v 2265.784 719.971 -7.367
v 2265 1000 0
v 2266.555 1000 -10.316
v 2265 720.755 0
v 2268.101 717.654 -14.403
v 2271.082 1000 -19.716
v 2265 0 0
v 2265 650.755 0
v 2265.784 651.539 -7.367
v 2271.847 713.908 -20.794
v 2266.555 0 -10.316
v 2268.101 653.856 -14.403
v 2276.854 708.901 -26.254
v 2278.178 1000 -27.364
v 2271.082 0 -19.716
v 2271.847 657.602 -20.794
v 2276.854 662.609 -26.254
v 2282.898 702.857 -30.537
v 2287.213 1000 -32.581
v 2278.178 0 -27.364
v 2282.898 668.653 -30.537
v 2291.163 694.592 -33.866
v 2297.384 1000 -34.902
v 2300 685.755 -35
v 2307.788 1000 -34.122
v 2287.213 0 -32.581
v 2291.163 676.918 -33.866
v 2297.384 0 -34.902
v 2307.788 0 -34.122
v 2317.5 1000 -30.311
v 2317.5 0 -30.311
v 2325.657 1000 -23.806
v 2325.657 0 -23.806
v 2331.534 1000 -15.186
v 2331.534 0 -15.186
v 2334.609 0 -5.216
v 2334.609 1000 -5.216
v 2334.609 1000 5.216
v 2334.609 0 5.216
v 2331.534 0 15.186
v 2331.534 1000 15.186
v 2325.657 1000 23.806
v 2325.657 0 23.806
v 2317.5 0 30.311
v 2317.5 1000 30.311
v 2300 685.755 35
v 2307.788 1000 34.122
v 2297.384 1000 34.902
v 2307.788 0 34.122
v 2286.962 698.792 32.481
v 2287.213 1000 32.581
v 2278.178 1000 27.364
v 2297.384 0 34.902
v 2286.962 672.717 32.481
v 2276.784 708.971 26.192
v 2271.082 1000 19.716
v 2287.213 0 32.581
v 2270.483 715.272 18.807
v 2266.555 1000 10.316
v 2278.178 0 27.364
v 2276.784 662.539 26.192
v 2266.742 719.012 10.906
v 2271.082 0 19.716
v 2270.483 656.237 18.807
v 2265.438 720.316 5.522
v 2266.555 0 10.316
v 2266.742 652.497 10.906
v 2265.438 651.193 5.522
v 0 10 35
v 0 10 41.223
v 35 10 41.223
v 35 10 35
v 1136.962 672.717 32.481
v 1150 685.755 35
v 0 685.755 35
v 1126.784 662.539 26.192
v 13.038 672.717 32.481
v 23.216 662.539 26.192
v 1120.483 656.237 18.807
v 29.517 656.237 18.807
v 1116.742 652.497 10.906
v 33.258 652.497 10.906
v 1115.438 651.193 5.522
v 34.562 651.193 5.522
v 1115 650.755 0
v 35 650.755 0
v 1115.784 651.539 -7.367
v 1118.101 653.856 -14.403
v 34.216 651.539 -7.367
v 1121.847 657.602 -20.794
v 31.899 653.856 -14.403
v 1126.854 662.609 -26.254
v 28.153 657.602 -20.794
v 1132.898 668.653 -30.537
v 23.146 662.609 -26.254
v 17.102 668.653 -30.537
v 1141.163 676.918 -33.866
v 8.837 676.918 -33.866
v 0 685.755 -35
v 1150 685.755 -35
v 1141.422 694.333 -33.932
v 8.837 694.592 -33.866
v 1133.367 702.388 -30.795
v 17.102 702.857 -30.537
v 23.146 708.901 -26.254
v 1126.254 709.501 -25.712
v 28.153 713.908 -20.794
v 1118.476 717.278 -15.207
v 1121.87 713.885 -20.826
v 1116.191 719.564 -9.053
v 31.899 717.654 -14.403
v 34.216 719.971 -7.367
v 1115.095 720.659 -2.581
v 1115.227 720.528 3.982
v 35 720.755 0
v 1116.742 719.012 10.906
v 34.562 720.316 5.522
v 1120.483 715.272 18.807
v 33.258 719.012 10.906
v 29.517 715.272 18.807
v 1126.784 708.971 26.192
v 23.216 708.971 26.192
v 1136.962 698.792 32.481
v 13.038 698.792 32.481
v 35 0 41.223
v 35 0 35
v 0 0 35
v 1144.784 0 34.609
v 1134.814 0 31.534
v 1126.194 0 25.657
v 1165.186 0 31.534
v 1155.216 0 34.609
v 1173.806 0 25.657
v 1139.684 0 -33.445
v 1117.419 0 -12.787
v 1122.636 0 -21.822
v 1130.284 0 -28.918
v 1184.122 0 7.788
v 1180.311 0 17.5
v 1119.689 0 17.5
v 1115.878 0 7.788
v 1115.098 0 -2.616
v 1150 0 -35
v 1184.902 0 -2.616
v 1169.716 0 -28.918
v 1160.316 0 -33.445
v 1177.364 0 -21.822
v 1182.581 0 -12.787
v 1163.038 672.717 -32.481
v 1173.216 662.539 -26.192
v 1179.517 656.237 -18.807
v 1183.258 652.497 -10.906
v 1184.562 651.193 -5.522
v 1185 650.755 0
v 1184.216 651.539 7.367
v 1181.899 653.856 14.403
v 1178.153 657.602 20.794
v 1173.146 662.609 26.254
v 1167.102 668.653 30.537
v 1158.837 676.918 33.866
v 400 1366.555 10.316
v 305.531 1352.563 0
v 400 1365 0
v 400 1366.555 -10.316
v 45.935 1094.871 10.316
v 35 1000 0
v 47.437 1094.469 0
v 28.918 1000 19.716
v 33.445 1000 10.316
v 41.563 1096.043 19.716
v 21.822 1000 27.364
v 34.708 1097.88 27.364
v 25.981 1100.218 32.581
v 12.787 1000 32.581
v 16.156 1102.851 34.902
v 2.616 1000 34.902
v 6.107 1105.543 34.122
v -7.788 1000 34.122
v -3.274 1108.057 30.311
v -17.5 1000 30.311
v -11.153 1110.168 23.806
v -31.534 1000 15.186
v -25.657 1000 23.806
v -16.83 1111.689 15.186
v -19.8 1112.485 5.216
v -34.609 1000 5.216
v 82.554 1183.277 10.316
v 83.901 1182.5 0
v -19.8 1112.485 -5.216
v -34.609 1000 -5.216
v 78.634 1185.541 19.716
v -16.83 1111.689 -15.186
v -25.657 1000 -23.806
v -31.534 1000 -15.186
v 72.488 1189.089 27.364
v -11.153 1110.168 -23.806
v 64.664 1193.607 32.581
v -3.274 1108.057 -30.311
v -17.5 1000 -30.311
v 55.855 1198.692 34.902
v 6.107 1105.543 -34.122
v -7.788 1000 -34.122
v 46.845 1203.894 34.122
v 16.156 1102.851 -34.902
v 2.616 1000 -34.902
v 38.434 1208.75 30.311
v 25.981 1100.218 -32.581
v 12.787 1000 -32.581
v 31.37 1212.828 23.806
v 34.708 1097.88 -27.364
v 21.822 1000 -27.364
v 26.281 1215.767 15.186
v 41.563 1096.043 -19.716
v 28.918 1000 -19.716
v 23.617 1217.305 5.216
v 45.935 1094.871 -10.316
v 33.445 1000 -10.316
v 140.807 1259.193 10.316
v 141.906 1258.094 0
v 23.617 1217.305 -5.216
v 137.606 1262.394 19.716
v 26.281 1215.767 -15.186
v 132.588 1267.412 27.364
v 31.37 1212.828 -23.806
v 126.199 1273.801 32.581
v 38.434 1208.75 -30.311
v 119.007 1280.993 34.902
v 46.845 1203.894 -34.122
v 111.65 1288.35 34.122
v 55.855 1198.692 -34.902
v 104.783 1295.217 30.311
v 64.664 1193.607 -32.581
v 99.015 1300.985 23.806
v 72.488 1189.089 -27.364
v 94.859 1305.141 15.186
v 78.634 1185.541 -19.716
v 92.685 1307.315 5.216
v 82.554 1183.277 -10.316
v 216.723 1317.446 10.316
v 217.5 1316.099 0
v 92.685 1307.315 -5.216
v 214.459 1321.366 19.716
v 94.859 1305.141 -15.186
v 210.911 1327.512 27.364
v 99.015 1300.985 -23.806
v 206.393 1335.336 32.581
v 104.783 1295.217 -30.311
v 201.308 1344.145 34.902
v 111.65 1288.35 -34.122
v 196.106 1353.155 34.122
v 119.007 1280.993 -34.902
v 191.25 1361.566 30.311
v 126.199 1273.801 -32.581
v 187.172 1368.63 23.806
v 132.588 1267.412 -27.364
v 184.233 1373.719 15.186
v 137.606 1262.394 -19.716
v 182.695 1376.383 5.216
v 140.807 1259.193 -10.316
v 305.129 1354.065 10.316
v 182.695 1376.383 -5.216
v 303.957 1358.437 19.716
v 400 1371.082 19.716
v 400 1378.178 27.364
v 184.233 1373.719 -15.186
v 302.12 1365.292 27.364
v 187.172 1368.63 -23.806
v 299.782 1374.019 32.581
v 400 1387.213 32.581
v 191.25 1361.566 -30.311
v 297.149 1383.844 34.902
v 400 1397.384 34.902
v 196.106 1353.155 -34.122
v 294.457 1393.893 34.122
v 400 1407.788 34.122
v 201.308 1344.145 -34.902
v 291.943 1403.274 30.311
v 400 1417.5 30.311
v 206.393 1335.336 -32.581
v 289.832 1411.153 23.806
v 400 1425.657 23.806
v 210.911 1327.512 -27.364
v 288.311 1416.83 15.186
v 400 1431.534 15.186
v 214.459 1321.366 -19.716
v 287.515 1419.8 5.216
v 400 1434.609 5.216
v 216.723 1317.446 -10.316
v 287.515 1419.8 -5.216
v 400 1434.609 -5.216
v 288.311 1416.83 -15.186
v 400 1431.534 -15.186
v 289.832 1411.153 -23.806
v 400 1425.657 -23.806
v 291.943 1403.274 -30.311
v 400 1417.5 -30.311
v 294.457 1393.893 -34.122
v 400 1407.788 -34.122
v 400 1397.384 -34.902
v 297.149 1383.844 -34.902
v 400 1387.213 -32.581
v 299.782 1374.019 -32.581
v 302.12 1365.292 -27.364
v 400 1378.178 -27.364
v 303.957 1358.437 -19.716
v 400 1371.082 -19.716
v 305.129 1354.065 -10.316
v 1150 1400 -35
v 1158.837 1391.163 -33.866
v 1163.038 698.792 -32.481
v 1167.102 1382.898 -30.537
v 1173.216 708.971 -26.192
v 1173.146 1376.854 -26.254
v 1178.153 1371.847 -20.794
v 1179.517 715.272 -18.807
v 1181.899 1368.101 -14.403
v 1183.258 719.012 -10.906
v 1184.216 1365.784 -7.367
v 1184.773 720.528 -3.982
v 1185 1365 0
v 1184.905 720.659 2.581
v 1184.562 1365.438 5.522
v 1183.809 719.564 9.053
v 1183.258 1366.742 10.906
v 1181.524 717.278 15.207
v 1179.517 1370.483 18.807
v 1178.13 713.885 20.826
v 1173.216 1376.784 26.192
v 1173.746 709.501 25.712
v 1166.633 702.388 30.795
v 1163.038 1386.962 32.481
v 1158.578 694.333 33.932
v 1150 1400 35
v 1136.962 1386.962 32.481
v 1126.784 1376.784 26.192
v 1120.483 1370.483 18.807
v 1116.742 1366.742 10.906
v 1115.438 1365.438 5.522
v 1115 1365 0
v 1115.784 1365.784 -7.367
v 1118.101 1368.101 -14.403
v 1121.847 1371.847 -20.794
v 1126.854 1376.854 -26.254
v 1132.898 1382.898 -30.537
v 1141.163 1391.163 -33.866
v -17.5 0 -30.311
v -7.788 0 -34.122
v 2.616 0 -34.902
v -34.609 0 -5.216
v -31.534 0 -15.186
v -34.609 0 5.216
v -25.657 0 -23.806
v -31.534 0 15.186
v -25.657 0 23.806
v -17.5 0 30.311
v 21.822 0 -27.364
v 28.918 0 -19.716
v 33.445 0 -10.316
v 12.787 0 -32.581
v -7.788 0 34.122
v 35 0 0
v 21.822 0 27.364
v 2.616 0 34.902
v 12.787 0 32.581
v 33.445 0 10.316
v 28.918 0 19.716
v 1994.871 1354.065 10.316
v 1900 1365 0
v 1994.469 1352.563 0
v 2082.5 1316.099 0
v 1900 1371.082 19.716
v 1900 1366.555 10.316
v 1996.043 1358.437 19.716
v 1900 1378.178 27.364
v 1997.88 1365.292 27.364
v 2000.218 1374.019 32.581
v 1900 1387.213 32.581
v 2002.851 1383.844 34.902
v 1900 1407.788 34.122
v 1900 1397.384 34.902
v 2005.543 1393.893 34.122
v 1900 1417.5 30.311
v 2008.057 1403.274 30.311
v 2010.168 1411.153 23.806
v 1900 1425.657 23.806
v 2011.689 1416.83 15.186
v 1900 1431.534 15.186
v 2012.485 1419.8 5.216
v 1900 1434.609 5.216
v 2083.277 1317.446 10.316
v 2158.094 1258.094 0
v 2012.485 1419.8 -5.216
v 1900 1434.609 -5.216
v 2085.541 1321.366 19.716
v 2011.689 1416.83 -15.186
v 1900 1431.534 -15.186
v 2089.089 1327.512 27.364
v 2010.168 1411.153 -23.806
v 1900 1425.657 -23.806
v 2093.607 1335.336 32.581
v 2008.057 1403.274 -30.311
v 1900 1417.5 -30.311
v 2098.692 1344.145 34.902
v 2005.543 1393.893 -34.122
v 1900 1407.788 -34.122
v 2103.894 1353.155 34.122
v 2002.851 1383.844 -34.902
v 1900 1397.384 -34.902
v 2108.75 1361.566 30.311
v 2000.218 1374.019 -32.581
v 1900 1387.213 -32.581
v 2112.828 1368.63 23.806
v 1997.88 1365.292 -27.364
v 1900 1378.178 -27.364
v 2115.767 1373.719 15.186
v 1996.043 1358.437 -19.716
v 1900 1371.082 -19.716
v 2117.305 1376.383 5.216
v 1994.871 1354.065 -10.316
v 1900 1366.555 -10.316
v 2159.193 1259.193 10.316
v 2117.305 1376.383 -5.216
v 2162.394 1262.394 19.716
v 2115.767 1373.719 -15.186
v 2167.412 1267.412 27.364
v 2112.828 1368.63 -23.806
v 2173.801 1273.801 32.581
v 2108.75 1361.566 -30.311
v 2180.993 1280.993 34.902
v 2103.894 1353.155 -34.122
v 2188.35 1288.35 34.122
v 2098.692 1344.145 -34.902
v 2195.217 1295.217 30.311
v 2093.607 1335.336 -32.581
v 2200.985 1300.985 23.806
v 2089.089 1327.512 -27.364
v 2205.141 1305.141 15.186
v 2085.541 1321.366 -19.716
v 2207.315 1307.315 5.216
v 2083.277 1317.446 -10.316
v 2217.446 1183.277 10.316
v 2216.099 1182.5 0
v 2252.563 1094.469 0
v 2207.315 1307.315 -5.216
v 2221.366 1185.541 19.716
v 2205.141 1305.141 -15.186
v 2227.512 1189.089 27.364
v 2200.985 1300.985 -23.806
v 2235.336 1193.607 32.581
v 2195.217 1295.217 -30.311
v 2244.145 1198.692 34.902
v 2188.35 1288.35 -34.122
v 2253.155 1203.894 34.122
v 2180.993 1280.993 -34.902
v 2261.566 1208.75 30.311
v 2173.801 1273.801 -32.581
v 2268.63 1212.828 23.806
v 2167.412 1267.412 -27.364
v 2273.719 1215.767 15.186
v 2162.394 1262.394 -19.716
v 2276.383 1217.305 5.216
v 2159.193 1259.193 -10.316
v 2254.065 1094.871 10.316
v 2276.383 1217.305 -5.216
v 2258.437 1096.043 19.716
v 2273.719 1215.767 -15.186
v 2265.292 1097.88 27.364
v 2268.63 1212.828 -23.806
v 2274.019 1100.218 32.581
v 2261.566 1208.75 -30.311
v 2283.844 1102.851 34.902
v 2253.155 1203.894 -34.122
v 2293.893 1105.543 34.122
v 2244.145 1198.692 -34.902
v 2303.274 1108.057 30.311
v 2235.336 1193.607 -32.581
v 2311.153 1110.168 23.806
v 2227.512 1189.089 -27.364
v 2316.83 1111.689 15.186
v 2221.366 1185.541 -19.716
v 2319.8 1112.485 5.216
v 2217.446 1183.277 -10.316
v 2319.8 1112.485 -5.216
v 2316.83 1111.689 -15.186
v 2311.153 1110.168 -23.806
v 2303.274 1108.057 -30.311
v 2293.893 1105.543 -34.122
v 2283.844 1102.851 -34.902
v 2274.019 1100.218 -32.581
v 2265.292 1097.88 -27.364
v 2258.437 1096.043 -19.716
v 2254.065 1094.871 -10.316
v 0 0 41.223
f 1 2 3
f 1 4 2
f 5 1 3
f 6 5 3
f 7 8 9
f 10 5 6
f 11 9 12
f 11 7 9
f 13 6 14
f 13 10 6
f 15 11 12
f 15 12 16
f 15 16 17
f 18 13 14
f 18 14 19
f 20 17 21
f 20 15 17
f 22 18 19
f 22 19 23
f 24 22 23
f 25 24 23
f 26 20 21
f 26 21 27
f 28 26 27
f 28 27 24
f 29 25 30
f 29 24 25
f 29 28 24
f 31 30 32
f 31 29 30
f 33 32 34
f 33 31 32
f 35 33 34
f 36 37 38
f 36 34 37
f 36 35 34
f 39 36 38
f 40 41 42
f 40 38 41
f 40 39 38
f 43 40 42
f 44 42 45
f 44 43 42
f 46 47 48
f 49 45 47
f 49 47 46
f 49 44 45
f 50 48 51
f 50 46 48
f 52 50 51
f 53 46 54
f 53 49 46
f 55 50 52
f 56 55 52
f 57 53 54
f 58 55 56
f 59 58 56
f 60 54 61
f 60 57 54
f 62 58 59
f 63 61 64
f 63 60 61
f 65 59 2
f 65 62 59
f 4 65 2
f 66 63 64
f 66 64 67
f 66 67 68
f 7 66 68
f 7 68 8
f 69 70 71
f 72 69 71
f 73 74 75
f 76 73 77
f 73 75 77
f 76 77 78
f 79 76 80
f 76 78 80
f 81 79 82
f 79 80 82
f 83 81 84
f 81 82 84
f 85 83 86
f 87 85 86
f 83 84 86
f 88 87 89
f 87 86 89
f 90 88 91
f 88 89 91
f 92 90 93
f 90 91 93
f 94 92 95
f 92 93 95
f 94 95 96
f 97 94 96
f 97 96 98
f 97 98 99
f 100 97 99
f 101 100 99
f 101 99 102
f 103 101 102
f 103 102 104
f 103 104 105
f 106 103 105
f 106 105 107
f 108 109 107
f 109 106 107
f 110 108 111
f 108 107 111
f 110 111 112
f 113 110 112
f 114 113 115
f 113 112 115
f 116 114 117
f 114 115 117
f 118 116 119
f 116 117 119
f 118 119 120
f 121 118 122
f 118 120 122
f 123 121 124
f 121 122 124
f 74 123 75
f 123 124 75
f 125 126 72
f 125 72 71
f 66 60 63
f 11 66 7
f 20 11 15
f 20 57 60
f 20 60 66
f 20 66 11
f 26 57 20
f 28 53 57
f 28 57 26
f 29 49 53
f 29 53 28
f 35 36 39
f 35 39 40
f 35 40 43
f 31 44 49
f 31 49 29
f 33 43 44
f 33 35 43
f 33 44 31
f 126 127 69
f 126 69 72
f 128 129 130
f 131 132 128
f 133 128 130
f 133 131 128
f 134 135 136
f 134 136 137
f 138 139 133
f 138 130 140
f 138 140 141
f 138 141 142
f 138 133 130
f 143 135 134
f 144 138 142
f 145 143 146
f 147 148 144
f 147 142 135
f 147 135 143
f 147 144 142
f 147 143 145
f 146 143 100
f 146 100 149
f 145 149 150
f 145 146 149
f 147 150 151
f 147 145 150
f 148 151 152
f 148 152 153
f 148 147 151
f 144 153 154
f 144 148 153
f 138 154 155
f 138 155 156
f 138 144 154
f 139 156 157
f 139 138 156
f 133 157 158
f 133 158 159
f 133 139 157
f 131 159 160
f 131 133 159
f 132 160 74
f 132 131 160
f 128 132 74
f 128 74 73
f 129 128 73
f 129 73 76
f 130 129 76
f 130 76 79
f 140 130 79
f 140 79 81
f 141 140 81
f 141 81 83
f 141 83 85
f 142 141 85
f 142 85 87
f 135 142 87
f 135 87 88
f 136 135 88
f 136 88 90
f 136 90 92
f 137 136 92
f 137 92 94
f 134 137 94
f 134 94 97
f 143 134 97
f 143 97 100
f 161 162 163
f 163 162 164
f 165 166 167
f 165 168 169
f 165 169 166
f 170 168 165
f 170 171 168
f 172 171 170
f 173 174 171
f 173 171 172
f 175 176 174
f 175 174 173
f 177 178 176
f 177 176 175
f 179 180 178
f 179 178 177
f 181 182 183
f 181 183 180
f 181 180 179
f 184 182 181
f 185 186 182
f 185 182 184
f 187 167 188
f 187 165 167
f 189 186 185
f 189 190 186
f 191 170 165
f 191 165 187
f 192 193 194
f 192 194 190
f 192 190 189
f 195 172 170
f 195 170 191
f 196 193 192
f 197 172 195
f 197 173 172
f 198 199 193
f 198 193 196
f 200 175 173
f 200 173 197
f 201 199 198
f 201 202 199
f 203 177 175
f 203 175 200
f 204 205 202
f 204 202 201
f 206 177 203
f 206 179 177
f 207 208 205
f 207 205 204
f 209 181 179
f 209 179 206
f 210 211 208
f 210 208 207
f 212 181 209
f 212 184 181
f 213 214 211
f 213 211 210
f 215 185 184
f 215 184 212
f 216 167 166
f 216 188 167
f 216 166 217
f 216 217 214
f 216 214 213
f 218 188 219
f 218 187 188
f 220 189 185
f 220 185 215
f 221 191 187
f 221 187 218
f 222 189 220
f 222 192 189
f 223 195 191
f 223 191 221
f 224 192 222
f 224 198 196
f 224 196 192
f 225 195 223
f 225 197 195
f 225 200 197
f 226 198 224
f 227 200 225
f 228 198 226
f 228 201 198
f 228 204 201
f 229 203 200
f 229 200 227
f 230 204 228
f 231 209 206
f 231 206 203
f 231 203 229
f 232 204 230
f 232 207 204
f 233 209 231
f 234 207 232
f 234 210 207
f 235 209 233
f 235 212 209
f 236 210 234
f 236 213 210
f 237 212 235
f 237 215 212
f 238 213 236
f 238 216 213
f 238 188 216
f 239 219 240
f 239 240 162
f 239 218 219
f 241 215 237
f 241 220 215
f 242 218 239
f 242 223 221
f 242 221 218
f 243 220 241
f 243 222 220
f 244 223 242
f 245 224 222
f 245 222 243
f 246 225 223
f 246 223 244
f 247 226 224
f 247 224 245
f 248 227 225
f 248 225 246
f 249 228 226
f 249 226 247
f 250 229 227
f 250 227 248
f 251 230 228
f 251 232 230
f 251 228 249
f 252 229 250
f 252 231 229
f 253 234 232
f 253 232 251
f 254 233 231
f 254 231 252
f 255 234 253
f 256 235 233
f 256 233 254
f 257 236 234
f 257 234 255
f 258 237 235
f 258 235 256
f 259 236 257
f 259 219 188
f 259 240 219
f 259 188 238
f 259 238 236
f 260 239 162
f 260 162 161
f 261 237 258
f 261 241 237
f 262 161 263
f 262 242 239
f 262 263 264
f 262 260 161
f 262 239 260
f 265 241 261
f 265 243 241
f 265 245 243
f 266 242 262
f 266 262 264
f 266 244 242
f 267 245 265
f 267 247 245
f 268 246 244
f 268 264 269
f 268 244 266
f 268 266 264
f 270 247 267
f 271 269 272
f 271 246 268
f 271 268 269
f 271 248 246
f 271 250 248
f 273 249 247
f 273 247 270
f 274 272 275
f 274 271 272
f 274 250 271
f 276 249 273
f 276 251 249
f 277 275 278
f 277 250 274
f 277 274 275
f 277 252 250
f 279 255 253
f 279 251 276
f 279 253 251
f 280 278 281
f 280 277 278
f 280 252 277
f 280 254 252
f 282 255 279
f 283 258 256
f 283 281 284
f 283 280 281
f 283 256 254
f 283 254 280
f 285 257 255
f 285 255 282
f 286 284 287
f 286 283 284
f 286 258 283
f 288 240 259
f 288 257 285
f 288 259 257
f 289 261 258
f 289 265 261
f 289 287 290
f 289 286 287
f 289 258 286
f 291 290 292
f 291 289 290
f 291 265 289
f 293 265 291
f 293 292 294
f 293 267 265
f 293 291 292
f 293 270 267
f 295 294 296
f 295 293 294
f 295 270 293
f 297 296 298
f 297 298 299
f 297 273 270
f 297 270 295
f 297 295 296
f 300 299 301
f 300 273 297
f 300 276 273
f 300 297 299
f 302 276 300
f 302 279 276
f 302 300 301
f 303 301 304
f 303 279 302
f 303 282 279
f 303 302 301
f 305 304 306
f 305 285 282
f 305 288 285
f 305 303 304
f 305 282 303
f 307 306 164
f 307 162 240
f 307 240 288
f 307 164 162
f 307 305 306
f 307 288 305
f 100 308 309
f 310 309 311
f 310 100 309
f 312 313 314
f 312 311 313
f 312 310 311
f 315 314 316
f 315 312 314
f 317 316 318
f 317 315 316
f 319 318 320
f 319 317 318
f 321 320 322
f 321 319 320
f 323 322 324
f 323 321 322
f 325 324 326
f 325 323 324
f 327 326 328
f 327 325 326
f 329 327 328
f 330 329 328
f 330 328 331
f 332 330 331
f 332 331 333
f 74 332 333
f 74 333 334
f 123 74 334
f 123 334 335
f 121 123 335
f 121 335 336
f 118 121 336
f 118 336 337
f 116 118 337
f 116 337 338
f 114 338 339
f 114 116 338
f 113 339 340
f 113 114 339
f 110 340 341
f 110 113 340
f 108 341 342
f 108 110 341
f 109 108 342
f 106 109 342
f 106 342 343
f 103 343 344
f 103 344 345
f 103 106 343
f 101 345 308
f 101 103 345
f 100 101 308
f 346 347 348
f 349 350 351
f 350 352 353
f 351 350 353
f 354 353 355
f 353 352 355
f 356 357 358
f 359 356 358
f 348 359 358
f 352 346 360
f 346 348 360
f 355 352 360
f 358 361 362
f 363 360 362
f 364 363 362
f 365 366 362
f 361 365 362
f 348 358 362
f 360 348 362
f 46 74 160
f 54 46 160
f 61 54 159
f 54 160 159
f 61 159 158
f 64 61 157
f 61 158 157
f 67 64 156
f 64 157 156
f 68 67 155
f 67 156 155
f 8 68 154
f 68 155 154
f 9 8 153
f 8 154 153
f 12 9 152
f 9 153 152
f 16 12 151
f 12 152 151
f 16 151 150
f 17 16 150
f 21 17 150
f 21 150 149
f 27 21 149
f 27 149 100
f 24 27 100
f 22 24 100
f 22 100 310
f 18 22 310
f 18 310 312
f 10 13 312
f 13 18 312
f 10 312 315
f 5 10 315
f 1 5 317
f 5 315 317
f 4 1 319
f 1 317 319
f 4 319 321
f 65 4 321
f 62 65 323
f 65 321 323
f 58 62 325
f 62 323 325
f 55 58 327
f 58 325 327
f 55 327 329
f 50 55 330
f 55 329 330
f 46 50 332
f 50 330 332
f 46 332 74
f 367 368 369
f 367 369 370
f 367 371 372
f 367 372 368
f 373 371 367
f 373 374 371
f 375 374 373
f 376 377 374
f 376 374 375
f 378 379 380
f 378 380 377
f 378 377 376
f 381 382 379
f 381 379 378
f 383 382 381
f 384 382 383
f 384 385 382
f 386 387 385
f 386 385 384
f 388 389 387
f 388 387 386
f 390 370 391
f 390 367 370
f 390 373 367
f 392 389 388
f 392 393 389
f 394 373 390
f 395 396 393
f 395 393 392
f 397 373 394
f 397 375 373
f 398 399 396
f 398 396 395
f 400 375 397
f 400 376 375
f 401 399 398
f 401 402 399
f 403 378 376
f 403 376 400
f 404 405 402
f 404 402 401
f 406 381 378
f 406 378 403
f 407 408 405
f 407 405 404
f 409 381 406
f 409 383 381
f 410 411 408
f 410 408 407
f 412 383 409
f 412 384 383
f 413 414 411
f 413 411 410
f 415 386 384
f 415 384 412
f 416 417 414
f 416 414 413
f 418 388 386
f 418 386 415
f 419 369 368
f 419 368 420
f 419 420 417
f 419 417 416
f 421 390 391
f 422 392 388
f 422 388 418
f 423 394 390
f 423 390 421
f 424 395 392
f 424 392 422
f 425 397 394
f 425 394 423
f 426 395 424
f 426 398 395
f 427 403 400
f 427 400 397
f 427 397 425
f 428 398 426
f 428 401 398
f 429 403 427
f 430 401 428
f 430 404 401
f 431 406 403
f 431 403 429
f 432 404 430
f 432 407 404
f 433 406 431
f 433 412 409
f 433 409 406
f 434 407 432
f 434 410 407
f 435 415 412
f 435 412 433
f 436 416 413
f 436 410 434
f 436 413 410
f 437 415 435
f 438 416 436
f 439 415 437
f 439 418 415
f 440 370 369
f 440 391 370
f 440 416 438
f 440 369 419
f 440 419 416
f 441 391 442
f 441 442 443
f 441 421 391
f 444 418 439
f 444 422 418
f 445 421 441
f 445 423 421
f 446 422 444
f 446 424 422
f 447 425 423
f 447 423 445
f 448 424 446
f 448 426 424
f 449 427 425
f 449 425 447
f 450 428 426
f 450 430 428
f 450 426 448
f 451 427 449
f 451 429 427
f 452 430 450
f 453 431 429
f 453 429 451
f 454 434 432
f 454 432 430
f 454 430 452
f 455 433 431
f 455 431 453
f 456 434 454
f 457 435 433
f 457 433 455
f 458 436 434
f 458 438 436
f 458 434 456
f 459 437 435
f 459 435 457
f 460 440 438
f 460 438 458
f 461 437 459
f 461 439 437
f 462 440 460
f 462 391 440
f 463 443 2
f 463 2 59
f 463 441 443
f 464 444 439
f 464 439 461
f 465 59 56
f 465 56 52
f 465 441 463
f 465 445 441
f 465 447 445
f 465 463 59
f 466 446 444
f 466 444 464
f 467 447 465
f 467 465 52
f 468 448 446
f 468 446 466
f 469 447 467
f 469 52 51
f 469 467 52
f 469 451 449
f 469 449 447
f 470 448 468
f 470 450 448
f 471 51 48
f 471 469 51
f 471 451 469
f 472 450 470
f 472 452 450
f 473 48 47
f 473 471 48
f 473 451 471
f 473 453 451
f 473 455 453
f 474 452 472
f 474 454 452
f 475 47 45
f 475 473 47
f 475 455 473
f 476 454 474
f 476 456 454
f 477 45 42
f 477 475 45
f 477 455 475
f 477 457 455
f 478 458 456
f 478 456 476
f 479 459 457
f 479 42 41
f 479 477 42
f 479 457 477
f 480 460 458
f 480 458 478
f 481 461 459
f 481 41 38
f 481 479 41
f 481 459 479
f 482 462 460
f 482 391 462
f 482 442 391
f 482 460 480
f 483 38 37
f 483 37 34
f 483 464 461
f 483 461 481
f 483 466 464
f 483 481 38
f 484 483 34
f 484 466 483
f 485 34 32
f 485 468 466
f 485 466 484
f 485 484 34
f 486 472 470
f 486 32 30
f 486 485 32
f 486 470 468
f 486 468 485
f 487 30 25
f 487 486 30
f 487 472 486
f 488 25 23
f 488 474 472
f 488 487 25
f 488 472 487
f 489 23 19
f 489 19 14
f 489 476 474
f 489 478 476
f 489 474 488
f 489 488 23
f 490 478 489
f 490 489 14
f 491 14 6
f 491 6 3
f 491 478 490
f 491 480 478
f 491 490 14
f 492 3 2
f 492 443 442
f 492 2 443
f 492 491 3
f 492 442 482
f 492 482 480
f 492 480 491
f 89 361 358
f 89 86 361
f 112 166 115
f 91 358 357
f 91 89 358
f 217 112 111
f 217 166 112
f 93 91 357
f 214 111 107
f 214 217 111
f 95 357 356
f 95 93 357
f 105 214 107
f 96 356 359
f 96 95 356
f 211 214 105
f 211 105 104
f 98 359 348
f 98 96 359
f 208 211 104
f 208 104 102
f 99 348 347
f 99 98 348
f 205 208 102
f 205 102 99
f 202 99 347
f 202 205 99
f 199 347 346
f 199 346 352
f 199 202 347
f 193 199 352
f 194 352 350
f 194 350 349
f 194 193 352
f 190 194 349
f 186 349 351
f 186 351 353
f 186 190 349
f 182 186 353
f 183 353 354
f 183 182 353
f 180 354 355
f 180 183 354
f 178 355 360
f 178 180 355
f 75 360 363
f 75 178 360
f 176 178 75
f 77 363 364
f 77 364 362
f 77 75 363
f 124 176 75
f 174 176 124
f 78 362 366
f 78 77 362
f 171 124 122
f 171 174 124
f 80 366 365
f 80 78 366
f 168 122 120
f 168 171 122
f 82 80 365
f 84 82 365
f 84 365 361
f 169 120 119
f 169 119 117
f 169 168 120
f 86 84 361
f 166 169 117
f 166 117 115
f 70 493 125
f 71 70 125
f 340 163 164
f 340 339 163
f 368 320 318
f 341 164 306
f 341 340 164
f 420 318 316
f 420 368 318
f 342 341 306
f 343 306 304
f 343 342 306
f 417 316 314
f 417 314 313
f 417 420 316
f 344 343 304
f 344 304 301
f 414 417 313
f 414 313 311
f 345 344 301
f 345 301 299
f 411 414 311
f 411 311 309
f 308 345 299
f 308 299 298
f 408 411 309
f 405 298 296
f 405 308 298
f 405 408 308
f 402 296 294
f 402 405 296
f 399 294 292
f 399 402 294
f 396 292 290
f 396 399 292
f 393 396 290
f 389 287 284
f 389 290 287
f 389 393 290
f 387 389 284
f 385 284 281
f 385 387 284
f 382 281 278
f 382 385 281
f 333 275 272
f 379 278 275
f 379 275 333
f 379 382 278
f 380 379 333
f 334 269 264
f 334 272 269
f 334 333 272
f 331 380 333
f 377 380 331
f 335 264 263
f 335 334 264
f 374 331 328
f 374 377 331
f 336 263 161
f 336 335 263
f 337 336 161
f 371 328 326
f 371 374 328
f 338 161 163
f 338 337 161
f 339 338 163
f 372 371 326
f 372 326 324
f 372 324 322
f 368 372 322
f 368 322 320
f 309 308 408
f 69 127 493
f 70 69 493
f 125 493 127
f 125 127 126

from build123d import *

# Parameters (mm, degrees)
SKETCH_4_R      = 35
SKETCH_8_R      = 35
EXTRUDE_6_DEPTH = 1400
SKETCH_9_R      = 35
EXTRUDE_7_DEPTH = 2300
SKETCH_10_W     = 35
SKETCH_10_H     = 6.222529257
EXTRUDE_8_DEPTH = 10


with BuildPart() as part:
    # 扫描2: sweep along a path in 草图3
    with BuildLine(Plane.XY) as sweep_2_path:
        Line((0, 0), (0, 1000))
        ThreePointArc((0, 1000), (117.157287525, 1282.842712475), (400, 1400))
        Line((400, 1400), (1900, 1400))
        ThreePointArc((1900, 1400), (2182.842712475, 1282.842712475), (2300, 1000))
        Line((2300, 1000), (2300, 0))
    # 草图4 → 扫描2 (sweep)
    with BuildSketch(Plane(origin=(0, 0, 0), x_dir=(1, 0, 0), z_dir=(0, 1, 0))):
        Circle(SKETCH_4_R)
    sweep(path=sweep_2_path.line)

    # 草图8 → 凸台-拉伸6 (add)
    with BuildSketch(Plane.XZ):
        with Locations(Location((1150, 0, 0), (0, 0, 270))):
            Circle(SKETCH_8_R)
    extrude(amount=-EXTRUDE_6_DEPTH)

    # 草图9 → 凸台-拉伸7 (add)
    with BuildSketch(Plane(origin=(0, 0, 0), x_dir=(0, 0, -1), z_dir=(1, 0, 0))):
        with Locations(Location((0, 685.754772245, 0), (0, 0, 180))):
            Circle(SKETCH_9_R)
    extrude(amount=EXTRUDE_7_DEPTH)


with BuildPart() as body_2:
    # 草图10 → 凸台-拉伸8 (new body)
    with BuildSketch(Plane.XZ):
        with Locations((17.5, 38.111264629)):
            Rectangle(SKETCH_10_W, SKETCH_10_H)
    extrude(amount=-EXTRUDE_8_DEPTH)


solid = Compound([part.part, body_2.part])
